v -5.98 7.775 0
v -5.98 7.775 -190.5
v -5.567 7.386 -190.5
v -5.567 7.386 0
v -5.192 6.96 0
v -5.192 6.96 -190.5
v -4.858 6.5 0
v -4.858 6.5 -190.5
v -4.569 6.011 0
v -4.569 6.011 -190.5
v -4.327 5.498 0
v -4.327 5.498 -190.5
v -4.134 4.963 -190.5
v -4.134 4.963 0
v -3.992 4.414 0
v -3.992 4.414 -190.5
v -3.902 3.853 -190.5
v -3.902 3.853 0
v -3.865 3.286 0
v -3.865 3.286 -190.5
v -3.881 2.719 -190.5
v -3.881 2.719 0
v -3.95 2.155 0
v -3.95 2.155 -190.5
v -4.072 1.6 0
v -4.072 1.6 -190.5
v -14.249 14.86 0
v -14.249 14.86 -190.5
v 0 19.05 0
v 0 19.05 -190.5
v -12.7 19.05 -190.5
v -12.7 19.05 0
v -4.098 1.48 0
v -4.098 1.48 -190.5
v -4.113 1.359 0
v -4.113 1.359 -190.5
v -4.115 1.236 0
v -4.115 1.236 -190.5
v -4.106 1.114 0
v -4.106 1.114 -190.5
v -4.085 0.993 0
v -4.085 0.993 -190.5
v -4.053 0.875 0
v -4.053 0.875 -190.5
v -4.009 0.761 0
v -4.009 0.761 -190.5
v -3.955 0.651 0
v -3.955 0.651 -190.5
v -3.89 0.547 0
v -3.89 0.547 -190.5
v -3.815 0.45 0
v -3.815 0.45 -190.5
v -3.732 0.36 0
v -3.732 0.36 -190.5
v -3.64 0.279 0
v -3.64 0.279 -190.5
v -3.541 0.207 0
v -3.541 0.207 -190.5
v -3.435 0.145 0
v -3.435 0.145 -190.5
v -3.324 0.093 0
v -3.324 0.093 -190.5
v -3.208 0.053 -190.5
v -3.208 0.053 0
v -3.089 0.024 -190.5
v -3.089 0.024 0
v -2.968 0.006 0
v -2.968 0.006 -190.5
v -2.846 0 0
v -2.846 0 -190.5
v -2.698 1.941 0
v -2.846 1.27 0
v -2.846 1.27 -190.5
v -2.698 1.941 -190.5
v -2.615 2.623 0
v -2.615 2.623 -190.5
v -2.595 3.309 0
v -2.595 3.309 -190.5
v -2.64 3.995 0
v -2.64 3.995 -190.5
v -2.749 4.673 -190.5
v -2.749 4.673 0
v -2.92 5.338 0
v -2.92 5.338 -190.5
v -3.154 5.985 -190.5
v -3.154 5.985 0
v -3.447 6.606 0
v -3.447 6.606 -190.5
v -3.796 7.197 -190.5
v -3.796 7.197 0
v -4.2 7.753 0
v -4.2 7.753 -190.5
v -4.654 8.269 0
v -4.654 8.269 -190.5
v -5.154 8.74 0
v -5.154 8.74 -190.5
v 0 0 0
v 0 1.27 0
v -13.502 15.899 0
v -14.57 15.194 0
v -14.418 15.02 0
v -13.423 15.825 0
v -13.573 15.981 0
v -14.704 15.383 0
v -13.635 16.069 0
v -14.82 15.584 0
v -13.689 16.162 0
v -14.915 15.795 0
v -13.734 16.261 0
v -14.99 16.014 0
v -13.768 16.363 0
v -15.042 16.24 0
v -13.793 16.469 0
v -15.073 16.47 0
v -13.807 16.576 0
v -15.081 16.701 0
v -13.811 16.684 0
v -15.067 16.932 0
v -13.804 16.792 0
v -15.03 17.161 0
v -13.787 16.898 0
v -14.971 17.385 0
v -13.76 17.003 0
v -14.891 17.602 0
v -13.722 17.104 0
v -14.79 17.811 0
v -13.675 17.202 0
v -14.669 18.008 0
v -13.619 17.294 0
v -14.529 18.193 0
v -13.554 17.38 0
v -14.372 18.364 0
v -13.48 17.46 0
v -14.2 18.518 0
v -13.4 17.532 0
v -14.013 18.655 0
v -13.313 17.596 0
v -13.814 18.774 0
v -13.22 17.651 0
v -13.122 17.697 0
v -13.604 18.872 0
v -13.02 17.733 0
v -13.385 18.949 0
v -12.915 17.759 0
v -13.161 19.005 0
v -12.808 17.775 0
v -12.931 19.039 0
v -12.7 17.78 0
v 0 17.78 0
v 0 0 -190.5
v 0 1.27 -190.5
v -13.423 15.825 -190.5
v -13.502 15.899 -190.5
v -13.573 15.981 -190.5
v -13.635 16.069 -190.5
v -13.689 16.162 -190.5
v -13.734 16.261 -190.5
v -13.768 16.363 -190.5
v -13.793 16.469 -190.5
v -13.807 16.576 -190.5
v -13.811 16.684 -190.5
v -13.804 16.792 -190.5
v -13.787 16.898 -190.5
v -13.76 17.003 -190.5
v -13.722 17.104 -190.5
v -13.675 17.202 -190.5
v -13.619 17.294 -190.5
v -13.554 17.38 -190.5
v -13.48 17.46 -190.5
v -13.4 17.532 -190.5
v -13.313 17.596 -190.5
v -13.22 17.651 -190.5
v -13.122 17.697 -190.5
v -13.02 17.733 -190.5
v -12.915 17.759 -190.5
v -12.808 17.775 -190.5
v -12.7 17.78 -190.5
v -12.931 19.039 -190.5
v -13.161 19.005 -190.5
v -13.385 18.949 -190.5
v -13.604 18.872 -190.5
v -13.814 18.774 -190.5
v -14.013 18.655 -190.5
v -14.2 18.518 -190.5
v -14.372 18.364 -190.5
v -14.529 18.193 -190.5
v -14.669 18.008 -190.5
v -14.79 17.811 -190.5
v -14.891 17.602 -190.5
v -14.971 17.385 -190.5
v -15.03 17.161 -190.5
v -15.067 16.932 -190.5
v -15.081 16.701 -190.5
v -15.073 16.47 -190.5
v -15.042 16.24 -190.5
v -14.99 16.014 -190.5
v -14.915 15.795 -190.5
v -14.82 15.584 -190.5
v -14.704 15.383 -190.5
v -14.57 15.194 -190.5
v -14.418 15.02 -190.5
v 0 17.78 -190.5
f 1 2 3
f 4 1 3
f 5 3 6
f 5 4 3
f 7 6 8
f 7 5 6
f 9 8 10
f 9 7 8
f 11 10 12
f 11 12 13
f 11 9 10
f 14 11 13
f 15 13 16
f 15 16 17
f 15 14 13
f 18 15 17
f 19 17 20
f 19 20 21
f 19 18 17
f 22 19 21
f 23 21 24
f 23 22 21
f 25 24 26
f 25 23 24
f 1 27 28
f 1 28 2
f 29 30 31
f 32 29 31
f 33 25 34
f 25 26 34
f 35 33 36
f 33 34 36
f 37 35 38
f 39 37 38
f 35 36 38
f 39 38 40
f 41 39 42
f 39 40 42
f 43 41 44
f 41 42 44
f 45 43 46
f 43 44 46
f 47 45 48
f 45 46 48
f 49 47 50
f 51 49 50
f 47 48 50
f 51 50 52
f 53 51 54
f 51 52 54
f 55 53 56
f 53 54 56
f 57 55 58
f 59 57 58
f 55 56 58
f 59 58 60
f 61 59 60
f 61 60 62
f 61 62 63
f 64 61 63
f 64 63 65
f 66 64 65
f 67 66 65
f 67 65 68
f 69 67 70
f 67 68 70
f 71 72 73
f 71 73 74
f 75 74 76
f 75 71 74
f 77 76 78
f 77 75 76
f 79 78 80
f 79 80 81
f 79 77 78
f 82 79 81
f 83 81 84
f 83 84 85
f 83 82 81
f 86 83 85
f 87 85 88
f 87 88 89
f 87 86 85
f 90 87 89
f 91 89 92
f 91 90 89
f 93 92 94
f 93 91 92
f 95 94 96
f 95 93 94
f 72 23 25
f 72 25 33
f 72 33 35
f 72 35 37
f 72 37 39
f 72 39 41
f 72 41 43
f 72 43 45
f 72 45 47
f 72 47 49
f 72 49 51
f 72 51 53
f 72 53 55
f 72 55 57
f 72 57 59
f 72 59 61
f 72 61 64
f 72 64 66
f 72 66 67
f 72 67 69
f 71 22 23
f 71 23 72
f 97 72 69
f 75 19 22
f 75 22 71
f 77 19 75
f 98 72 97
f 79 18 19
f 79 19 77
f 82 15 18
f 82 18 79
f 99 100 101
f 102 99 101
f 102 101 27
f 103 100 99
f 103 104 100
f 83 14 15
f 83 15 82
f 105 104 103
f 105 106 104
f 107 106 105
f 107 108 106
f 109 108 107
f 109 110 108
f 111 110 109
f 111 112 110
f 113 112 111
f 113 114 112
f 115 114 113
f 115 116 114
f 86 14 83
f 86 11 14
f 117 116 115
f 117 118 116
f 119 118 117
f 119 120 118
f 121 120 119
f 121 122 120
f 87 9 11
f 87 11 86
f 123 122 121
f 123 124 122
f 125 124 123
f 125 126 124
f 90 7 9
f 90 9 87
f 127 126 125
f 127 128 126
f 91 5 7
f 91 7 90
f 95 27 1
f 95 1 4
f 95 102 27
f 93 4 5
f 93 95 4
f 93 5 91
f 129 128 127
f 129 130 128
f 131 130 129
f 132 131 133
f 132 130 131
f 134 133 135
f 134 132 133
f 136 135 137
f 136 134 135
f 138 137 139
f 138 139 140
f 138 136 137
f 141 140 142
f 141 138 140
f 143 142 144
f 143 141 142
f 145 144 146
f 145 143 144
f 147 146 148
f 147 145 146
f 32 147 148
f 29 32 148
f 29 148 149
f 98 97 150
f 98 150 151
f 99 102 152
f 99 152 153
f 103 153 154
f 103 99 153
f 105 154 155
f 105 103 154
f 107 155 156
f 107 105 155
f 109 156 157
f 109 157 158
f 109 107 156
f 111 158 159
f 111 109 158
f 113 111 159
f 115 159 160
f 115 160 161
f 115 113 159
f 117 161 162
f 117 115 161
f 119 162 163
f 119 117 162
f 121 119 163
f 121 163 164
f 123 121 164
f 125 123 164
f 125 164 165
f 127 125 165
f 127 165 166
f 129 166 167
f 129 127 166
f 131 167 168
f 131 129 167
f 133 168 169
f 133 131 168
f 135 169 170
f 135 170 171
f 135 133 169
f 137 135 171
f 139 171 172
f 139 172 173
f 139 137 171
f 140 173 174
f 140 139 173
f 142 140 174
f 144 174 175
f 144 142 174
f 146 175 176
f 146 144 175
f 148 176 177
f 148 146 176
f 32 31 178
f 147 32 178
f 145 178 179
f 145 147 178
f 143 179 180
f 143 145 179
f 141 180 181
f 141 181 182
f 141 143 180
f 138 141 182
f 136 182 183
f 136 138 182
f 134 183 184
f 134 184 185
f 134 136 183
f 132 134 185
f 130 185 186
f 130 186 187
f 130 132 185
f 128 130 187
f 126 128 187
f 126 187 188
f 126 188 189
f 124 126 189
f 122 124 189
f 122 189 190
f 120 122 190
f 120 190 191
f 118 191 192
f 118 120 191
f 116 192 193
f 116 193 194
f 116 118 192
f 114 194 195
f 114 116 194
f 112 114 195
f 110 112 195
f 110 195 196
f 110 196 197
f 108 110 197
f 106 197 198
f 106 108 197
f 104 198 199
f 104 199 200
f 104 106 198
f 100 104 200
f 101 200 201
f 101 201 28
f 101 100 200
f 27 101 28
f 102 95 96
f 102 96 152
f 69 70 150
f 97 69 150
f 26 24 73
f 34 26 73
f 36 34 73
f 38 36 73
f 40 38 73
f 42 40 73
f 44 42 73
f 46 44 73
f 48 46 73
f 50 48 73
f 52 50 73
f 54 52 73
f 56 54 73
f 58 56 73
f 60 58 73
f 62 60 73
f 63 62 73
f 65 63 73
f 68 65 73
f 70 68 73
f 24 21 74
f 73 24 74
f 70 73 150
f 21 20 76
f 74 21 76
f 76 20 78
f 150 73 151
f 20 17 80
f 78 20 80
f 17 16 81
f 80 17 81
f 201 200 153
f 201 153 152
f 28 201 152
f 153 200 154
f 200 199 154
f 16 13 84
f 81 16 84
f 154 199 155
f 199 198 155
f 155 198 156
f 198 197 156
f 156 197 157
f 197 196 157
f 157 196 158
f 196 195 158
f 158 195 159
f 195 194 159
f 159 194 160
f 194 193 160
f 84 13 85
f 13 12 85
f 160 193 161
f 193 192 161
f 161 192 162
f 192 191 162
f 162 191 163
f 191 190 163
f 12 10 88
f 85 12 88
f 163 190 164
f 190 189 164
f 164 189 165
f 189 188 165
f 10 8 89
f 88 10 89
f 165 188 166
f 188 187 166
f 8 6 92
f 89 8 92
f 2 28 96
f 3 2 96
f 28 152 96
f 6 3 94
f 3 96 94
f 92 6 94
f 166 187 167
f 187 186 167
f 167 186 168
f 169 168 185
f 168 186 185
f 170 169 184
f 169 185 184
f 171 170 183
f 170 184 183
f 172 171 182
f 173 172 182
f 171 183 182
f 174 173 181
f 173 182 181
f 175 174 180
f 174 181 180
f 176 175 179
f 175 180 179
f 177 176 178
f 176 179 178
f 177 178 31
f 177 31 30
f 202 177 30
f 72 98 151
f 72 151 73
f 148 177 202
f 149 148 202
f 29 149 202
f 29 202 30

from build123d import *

# Parameters (mm, degrees)
EXTRUDE_THIN1_DEPTH = 190.5
FILLET1_R           = 1.27


with BuildPart() as part:
    # Sketch2 → Extrude-Thin1 (new body)
    with BuildSketch(Plane.XY):
        with BuildLine():
            Line((0, 19.05), (-12.7, 19.05))
            ThreePointArc((-12.7, 19.05), (-14.933416251, 17.494706059), (-14.249357426, 14.860479244))
            Line((-14.249357426, 14.860479244), (-5.98022255, 7.775342526))
            ThreePointArc((-5.98022255, 7.775342526), (-3.936796637, 4.112343257), (-4.7625, 0))
            Line((-4.7625, 0), (0, 0))
            Line((0, 0), (0, 1.27))
            Line((0, 1.27), (-2.845784509, 1.27))
            ThreePointArc((-2.845784509, 1.27), (-2.920461936, 5.33839935), (-5.153898589, 8.739753596))
            Line((-5.153898589, 8.739753596), (-13.423033466, 15.824890314))
            ThreePointArc((-13.423033466, 15.824890314), (-13.742260917, 17.054196161), (-12.7, 17.78))
            Line((-12.7, 17.78), (0, 17.78))
            Line((0, 17.78), (0, 19.05))
        make_face()
    extrude(amount=-EXTRUDE_THIN1_DEPTH)

    # Fillet1
    fillet1_edges = [part.edges().sort_by_distance(p)[0] for p in [
        (-4.7625, 0, -95.25),
    ]]
    fillet(fillet1_edges, radius=FILLET1_R)


solid = part.part
